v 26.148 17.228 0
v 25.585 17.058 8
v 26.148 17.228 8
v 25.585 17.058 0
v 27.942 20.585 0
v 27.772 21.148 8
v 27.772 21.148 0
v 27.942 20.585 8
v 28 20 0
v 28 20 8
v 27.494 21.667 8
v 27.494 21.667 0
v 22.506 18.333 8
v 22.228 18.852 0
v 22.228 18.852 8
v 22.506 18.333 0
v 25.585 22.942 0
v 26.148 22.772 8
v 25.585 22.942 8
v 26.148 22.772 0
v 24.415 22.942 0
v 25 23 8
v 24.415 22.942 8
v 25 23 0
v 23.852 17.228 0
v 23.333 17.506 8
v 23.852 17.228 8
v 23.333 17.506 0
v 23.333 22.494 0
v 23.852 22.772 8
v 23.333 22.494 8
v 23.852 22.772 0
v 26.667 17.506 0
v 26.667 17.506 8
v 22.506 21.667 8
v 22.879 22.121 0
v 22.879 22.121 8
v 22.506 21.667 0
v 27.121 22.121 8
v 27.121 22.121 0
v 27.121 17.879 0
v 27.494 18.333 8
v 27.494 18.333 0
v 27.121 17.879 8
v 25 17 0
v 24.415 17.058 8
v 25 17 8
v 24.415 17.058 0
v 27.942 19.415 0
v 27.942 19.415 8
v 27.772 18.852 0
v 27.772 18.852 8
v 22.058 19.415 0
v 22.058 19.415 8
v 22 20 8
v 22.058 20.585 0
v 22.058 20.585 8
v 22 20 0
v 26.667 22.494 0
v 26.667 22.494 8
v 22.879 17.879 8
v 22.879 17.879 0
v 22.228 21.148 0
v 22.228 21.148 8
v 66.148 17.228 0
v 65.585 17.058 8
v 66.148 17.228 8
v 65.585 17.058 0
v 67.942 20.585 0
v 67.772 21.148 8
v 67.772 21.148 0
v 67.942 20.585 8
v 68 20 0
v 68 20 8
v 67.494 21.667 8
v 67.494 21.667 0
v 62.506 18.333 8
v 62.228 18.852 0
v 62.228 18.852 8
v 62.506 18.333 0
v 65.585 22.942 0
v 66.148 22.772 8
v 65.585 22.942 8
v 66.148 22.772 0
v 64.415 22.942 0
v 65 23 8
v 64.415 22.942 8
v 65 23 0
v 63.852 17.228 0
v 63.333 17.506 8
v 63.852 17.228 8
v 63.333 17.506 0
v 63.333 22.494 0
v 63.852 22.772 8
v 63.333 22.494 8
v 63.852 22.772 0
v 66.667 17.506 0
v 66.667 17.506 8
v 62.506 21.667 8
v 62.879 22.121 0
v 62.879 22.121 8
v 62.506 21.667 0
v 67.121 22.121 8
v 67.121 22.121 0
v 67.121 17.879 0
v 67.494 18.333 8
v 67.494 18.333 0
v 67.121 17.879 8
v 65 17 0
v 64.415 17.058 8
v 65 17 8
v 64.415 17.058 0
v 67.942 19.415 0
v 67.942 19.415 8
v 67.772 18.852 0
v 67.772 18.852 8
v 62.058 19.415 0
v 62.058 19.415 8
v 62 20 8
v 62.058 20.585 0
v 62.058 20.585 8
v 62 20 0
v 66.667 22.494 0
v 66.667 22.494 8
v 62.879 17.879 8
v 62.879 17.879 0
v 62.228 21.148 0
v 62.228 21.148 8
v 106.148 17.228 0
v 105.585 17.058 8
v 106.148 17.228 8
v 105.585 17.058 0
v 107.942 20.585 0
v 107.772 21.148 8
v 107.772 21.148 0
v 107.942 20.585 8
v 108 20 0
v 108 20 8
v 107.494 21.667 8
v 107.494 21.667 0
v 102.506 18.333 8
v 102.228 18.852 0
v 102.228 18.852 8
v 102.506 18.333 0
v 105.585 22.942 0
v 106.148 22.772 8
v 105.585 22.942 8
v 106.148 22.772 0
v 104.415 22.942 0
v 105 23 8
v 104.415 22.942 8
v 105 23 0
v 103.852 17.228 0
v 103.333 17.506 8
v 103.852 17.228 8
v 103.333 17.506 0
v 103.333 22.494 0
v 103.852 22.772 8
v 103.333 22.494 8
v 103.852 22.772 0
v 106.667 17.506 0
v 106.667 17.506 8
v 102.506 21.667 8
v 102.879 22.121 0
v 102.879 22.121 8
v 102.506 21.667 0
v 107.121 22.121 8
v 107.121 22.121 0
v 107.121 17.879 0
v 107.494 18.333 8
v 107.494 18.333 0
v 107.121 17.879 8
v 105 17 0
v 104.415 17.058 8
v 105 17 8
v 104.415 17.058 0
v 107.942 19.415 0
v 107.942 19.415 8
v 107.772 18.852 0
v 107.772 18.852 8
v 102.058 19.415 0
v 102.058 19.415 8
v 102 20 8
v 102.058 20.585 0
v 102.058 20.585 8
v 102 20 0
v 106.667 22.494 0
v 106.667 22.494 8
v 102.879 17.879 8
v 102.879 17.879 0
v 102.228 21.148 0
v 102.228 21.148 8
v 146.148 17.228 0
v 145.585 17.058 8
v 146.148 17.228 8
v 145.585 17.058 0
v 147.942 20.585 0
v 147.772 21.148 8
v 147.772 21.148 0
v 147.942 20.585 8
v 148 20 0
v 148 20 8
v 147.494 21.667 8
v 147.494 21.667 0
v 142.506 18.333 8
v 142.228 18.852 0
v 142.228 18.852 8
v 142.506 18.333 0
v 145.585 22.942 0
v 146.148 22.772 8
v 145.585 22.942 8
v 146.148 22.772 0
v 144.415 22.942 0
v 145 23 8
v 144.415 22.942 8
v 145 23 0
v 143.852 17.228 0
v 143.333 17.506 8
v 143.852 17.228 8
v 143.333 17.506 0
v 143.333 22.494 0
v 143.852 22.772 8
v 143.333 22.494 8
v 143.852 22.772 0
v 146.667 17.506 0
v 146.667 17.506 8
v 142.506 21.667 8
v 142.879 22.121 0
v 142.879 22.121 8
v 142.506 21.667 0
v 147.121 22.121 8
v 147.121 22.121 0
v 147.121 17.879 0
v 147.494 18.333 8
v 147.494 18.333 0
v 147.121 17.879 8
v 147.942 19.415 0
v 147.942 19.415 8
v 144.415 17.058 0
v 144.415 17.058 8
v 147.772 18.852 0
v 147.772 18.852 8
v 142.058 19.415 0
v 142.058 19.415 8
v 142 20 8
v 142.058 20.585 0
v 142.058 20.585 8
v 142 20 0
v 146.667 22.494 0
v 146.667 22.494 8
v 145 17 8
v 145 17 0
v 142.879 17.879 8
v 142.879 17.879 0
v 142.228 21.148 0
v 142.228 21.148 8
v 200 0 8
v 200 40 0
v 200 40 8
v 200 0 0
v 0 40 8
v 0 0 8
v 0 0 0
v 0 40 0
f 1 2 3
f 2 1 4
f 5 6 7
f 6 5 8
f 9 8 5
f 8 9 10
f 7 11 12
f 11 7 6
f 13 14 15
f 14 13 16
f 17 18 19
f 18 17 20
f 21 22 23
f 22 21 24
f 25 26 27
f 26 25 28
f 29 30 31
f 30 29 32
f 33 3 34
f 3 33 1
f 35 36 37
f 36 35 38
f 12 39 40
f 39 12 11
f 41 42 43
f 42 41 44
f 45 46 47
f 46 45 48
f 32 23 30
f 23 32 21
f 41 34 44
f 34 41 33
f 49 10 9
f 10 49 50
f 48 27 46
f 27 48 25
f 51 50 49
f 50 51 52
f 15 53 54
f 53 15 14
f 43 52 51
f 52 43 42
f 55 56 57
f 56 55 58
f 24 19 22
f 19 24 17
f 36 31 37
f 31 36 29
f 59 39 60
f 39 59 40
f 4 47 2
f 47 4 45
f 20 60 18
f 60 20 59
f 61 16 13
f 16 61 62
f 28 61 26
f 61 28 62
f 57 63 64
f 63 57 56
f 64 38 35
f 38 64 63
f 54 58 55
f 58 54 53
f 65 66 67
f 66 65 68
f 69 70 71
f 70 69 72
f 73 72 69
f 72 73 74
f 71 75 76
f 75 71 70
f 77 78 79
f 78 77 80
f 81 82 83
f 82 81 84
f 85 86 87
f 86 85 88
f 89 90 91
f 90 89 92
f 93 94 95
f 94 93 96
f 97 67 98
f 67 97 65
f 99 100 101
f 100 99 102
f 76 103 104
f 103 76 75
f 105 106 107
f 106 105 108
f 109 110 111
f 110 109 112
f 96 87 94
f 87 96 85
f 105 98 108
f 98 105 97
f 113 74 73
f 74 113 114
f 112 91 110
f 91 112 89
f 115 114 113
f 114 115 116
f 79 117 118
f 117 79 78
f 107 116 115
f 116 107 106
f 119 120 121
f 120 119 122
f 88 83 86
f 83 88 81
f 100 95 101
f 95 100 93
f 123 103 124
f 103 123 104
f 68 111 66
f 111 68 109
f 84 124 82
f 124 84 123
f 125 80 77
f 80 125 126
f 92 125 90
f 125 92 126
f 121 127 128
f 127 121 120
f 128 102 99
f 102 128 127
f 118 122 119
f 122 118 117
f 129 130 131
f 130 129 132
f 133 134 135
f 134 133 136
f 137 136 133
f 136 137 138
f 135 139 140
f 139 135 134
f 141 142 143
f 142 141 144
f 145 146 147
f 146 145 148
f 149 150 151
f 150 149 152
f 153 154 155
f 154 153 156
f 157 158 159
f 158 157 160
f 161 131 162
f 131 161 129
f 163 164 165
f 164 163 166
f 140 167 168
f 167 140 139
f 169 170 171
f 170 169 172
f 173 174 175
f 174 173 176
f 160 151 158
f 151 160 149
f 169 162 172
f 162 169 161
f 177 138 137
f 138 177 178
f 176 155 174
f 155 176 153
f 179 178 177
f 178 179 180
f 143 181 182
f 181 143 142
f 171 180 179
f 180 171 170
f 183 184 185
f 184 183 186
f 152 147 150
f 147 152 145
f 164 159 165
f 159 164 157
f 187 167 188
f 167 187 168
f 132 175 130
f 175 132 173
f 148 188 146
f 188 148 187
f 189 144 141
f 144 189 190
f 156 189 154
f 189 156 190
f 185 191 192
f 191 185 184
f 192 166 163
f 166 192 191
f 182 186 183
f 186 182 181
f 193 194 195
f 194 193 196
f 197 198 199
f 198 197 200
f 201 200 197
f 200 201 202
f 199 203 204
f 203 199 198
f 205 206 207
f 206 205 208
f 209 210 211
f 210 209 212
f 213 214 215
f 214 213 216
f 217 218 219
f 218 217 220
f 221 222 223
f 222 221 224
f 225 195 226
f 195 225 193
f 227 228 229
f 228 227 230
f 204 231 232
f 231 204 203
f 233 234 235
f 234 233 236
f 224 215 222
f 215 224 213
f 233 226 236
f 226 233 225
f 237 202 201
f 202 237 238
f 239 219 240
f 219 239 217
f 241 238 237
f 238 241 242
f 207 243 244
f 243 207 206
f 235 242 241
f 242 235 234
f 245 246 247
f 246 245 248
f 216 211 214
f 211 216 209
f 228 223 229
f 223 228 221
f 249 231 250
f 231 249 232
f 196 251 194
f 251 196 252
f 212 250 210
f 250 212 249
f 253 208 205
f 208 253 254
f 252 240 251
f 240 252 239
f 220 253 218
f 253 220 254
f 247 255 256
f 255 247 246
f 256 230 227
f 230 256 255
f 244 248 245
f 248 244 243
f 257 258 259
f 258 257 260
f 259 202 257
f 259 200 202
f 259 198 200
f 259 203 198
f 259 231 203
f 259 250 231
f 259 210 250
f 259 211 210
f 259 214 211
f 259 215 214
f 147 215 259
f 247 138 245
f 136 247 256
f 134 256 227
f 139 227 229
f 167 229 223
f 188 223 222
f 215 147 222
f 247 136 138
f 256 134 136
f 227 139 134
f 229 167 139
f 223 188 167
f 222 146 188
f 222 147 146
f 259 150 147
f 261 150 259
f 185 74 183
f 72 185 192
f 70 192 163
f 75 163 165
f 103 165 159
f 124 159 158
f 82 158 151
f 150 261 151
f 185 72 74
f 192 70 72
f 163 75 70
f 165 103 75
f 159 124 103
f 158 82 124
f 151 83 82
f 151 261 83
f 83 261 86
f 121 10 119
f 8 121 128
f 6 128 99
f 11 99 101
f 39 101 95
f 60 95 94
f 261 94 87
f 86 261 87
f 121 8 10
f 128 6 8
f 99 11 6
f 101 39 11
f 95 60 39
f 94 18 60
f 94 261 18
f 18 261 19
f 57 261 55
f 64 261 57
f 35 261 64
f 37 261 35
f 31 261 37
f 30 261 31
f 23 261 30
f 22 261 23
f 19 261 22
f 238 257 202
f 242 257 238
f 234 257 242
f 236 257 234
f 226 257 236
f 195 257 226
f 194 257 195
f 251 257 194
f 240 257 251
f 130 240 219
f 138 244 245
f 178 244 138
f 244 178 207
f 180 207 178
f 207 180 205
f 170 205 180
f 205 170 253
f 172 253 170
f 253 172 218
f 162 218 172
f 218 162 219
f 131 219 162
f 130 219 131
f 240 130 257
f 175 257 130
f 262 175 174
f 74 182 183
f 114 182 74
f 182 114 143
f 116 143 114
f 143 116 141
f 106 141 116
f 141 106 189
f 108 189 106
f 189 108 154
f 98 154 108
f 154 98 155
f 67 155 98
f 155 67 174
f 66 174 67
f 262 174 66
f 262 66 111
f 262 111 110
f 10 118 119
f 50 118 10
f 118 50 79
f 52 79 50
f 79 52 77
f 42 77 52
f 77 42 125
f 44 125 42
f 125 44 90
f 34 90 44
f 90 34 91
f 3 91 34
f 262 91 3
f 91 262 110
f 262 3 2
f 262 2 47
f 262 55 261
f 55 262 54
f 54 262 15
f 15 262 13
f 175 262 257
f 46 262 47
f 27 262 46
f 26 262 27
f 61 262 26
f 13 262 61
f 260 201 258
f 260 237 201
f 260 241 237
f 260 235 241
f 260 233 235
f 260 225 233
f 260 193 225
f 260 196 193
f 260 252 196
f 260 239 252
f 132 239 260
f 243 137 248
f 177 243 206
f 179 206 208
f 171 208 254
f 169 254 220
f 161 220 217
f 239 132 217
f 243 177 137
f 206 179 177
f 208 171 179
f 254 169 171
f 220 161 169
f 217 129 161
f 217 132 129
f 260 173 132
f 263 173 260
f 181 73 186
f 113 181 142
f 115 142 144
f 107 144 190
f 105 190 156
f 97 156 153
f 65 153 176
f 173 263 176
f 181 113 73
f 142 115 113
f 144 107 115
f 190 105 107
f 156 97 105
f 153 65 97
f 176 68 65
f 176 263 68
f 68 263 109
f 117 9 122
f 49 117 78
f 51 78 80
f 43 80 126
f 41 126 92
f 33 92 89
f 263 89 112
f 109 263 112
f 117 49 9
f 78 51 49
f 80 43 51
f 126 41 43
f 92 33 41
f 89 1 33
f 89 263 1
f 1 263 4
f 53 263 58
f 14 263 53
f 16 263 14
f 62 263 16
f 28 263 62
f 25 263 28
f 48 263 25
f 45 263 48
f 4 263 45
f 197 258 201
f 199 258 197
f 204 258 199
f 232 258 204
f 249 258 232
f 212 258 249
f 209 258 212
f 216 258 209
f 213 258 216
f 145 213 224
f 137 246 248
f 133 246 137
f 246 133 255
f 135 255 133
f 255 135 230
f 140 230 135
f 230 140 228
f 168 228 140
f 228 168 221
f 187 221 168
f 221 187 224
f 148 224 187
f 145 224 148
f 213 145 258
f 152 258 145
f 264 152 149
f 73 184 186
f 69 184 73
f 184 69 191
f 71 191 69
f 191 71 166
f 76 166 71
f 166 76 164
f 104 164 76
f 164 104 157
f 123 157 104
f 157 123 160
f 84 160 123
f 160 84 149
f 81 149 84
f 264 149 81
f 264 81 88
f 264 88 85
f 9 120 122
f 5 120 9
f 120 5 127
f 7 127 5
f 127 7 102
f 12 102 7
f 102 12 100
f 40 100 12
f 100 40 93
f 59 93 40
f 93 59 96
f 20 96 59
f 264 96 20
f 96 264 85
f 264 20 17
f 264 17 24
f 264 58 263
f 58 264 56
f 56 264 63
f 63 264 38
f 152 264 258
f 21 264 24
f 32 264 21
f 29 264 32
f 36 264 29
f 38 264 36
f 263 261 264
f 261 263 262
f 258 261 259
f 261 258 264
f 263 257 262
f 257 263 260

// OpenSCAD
$fn = 32;

// ----------------------------------------------------------------------
// Long rail: 200-250 mm mounting rail
// ----------------------------------------------------------------------

// --- parameters (mm) ---
rail_l = 200;             // rail length, X
rail_w = 40;              // rail width, Y
rail_t = 8;               // rail thickness, Z
hole_d = 6;               // mounting hole diameter
hole_start = 25;          // first hole offset from the end
hole_pitch = 40;          // hole pitch
holes = 4;                // number of holes

difference() {
  cube([rail_l, rail_w, rail_t]);
  for (i = [0 : holes - 1])
    translate([hole_start + i * hole_pitch, rail_w / 2, -1])
      cylinder(h = rail_t + 2, d = hole_d);
}
